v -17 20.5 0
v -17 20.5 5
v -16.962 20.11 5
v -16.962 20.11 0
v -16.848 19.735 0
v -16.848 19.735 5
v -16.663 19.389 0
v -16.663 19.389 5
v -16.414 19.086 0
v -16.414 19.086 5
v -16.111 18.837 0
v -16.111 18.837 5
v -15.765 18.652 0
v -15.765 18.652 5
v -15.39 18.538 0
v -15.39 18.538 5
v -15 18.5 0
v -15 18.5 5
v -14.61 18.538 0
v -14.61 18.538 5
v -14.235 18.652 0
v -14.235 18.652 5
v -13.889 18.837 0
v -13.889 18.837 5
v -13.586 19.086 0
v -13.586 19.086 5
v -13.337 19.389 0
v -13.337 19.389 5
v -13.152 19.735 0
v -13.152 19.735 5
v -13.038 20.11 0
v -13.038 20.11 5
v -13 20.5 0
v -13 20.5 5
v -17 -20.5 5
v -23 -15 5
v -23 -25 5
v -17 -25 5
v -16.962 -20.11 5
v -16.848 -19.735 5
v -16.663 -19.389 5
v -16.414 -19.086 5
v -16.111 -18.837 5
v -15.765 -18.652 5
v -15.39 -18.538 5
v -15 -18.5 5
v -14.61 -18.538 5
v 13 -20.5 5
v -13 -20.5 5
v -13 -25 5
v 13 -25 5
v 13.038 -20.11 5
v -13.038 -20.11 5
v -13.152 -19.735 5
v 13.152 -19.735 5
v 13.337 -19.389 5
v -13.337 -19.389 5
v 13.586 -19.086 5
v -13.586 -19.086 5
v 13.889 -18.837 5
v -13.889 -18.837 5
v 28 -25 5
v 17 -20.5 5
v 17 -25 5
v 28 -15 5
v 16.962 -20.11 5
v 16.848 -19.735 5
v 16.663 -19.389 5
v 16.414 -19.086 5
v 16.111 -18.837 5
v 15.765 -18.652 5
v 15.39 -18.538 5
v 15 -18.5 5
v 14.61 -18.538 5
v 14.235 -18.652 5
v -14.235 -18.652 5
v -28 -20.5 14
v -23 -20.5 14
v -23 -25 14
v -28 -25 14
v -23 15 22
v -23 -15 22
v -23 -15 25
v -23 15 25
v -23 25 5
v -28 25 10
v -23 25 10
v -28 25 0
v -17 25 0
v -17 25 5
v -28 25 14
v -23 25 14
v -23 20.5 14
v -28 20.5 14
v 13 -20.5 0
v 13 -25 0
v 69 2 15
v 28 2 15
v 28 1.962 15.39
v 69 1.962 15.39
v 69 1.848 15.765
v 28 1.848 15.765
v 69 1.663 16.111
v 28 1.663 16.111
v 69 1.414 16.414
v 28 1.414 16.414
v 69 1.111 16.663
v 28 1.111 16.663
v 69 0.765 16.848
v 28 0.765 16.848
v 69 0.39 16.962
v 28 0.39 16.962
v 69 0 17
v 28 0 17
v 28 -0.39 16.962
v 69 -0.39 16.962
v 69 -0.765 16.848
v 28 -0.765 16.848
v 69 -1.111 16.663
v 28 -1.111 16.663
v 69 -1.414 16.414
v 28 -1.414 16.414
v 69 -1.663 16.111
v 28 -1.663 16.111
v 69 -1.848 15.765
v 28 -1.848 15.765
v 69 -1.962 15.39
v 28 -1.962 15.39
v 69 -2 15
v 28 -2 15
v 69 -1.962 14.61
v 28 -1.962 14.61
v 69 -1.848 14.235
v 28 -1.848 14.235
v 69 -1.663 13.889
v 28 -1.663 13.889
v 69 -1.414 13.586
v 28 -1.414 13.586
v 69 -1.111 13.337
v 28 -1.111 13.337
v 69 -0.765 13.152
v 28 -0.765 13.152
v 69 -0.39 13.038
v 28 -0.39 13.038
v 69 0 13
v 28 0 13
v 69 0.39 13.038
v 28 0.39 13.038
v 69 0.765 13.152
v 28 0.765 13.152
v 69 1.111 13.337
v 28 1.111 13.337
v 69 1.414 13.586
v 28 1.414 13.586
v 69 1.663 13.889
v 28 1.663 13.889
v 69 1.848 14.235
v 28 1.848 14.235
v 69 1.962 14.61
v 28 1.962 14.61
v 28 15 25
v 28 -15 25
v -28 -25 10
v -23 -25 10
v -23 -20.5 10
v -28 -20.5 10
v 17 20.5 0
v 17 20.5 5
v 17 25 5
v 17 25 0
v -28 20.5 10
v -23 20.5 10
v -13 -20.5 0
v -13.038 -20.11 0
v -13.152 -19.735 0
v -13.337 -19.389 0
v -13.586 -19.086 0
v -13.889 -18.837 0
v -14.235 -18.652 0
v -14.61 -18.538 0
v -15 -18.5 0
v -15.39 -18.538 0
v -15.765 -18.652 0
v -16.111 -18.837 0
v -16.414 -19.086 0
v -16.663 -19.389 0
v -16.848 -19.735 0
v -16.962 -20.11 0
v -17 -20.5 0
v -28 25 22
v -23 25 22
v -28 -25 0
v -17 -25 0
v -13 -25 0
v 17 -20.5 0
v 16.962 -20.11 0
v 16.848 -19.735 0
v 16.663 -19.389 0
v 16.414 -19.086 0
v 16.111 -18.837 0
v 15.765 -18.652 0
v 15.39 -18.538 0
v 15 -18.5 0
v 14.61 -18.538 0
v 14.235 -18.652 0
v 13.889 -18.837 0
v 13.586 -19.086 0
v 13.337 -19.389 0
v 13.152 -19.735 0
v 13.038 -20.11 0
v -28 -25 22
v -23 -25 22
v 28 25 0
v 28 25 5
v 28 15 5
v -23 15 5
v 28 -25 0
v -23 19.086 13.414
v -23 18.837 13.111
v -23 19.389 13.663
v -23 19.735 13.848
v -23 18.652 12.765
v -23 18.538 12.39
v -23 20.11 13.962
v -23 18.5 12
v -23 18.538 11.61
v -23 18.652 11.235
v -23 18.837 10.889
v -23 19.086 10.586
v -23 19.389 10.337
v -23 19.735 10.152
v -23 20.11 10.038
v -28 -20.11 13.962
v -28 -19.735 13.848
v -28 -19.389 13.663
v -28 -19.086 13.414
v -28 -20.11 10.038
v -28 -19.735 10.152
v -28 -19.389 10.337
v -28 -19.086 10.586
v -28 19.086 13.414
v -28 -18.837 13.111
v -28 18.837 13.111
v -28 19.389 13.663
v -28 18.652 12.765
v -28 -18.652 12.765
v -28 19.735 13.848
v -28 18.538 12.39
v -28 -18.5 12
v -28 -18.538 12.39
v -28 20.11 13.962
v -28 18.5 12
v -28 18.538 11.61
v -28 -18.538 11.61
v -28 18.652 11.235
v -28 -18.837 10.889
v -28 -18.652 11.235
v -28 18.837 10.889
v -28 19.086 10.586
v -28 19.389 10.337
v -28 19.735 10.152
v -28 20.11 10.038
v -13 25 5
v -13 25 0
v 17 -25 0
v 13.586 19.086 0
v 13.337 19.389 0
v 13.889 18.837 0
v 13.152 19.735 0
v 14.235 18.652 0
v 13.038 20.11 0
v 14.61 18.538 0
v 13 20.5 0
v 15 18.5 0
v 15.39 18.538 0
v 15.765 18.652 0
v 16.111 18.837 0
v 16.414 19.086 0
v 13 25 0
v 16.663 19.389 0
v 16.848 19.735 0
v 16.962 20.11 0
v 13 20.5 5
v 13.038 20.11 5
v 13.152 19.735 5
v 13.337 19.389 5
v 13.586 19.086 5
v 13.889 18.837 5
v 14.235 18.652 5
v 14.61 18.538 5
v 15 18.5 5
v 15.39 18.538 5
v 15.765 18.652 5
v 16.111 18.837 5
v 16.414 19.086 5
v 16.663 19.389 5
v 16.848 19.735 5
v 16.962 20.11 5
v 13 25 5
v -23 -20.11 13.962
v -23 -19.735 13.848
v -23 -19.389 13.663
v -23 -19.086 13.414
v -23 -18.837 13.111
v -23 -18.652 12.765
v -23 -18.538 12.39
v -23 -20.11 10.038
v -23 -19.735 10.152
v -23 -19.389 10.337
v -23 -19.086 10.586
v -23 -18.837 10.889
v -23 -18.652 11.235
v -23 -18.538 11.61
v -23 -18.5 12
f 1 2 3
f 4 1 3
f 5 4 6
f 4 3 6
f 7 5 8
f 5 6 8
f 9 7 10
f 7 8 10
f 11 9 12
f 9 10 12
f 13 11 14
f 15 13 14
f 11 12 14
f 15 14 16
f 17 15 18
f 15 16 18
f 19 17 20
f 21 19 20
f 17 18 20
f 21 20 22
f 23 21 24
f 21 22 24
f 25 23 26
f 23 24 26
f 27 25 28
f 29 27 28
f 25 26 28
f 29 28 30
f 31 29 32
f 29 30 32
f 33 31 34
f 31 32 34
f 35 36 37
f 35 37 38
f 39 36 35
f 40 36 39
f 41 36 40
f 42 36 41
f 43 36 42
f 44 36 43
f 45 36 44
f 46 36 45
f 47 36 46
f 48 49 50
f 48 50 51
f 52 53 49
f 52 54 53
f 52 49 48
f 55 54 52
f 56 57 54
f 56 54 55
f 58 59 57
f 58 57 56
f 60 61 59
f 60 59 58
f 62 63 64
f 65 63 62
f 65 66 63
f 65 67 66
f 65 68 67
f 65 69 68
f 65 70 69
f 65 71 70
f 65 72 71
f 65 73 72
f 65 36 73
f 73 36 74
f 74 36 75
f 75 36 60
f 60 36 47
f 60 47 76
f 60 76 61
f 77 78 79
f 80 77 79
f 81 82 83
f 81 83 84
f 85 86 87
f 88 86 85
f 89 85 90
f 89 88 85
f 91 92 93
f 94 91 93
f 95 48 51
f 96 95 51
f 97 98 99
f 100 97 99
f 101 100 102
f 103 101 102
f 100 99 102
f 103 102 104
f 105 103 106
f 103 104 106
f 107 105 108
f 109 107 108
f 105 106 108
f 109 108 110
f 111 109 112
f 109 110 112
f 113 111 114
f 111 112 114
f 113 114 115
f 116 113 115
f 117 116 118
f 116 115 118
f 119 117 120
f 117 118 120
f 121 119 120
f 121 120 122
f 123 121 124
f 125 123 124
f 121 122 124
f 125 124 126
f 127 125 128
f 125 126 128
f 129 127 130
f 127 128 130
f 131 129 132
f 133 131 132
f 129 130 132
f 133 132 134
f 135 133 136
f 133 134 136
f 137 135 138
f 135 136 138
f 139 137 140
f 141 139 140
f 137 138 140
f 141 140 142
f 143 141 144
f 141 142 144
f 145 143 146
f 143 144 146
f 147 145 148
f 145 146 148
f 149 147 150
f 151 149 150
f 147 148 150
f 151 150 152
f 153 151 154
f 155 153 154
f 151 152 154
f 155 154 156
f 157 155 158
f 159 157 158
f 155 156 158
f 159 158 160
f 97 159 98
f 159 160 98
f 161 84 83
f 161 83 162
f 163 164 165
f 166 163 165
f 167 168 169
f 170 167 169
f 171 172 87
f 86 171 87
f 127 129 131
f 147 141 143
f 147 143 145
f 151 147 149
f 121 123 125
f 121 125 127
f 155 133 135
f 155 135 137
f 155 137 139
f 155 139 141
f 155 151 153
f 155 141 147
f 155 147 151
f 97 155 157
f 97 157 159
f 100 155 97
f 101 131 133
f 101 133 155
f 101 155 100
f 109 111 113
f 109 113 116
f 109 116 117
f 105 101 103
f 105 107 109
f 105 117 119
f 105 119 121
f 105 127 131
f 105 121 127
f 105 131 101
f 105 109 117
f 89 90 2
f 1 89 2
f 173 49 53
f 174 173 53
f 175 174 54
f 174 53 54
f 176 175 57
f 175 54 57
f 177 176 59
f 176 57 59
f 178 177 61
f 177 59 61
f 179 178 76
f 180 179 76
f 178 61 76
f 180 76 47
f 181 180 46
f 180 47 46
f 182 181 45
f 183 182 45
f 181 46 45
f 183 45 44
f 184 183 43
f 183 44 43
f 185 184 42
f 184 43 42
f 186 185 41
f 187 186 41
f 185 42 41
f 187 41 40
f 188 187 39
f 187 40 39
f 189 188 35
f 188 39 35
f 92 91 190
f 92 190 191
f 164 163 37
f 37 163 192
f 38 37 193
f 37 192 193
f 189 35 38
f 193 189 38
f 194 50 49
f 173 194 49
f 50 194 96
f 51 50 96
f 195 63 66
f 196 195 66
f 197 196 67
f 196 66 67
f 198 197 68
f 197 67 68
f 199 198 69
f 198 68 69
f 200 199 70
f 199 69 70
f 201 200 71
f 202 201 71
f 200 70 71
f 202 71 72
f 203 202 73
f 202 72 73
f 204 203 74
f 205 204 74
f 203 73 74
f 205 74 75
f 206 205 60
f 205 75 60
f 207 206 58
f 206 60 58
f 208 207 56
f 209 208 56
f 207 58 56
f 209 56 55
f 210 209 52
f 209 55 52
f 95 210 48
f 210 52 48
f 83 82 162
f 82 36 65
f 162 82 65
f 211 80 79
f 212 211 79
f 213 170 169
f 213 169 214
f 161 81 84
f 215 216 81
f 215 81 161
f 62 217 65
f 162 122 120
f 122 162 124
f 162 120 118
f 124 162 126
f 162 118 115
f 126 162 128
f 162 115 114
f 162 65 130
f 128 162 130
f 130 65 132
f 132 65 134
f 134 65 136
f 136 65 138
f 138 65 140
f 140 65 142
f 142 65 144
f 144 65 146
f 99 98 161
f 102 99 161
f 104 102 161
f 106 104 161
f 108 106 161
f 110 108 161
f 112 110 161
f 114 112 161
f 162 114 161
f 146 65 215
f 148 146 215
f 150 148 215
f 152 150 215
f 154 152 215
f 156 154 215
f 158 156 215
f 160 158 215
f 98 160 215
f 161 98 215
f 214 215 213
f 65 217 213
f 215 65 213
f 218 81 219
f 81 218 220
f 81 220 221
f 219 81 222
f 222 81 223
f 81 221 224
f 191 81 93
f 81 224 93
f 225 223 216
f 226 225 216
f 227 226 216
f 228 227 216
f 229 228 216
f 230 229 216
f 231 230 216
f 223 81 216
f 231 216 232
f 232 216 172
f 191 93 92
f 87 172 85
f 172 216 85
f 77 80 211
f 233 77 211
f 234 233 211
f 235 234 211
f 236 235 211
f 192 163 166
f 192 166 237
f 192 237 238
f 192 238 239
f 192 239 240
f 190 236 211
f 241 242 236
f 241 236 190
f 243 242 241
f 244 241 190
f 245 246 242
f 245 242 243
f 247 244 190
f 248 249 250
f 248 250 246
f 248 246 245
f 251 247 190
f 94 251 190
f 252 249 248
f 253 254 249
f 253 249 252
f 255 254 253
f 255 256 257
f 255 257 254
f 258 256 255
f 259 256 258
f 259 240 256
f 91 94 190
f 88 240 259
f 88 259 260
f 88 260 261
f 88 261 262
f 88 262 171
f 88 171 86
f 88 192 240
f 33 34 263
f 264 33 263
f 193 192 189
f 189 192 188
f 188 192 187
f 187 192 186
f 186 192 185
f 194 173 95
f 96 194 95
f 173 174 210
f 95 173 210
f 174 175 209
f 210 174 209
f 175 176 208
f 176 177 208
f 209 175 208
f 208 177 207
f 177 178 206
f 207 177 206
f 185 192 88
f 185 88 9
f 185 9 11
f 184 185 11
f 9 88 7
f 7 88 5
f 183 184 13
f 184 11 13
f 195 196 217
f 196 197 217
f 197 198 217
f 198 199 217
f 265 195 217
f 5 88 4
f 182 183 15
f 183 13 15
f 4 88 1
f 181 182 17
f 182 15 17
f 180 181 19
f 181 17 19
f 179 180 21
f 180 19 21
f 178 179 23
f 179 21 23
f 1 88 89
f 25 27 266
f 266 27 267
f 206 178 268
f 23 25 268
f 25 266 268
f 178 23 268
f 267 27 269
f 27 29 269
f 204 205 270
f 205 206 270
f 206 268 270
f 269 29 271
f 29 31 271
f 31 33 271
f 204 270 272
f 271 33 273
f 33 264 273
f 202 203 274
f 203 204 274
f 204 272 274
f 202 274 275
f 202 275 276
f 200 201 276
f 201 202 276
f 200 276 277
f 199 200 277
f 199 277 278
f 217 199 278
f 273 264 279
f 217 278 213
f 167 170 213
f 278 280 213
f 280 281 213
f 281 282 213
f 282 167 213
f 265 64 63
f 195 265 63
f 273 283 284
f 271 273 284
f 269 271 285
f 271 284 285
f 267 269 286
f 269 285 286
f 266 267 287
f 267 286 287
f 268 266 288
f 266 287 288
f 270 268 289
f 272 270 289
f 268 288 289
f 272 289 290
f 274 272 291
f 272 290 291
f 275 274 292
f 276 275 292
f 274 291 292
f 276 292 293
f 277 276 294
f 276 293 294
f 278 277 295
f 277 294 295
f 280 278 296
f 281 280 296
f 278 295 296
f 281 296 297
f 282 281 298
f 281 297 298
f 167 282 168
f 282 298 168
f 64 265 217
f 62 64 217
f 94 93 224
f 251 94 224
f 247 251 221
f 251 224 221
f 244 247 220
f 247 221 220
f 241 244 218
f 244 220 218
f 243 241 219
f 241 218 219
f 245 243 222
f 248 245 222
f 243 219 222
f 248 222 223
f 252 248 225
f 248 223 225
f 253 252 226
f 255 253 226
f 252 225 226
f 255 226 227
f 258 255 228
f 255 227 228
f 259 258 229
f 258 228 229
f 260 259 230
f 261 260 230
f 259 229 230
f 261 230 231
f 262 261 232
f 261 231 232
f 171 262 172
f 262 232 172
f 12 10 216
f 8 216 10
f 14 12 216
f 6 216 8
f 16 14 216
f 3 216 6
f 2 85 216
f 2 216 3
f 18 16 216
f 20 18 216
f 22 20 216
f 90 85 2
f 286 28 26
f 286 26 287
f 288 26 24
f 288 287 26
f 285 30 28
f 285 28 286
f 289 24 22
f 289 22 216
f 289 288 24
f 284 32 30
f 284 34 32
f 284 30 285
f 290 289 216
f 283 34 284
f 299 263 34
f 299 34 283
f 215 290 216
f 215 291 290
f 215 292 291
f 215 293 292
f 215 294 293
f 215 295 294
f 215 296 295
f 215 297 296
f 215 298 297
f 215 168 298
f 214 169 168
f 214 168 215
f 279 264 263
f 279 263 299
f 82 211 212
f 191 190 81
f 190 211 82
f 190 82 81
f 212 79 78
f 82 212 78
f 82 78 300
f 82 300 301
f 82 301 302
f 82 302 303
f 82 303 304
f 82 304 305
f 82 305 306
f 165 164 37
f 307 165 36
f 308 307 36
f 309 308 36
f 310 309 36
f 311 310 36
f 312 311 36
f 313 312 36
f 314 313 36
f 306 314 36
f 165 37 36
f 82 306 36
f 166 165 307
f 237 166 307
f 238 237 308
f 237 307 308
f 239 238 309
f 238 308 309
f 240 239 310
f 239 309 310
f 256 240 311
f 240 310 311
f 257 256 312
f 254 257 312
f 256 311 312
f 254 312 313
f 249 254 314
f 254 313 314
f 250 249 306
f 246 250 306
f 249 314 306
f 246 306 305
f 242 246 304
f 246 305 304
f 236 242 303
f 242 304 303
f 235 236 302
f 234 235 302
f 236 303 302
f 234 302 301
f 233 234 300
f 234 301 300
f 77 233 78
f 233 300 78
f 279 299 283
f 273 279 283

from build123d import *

# Parameters (mm, degrees)
F0_W      = 56
F0_H      = 50
F1_DEPTH  = 5
F3_DEPTH  = 5
F4_W      = 5
F4_H      = 50
F5_DEPTH  = 17
F6_W      = 51
F6_H      = 30
F7_DEPTH  = 20
F9_DEPTH  = 5
F10_R     = 2
F11_DEPTH = 41


with BuildPart() as f1:
    # F0 (on Top) → F1 (new body)
    with BuildSketch(Plane.XY):
        Rectangle(F0_W, F0_H)
    extrude(amount=F1_DEPTH)

    # F2 (on face) → F3 (cut, through all)
    with BuildSketch(Plane.XY.offset(5)):
        with BuildLine():
            Line((17, -25), (17, -20.5))
            ThreePointArc((17, -20.5), (15, -18.5), (13, -20.5))
            Line((13, -20.5), (13, -25))
            Line((13, -25), (17, -25))
        make_face()
        with BuildLine():
            ThreePointArc((13, 20.5), (15, 18.5), (17, 20.5))
            Line((17, 20.5), (17, 25))
            Line((17, 25), (13, 25))
            Line((13, 25), (13, 20.5))
        make_face()
        with BuildLine():
            Line((-17, 25), (-17, 20.5))
            ThreePointArc((-17, 20.5), (-15, 18.5), (-13, 20.5))
            Line((-13, 20.5), (-13, 25))
            Line((-13, 25), (-17, 25))
        make_face()
        with BuildLine():
            ThreePointArc((-13, -20.5), (-15, -18.5), (-17, -20.5))
            Line((-17, -20.5), (-17, -25))
            Line((-17, -25), (-13, -25))
            Line((-13, -25), (-13, -20.5))
        make_face()
    extrude(amount=-F3_DEPTH, mode=Mode.SUBTRACT)

    # F4 (on face) → F5 (join)
    with BuildSketch(Plane.XY.offset(5)):
        with Locations((-25.5, 0)):
            Rectangle(F4_W, F4_H)
    extrude(amount=F5_DEPTH)

    # F6 (on face) → F7 (join)
    with BuildSketch(Plane.XY.offset(5)):
        with Locations((2.5, 0)):
            Rectangle(F6_W, F6_H)
    extrude(amount=F7_DEPTH)

    # F8 (on face) → F9 (cut, through all)
    with BuildSketch(Plane.YZ.offset(-23)):
        with BuildLine():
            Line((-25, 10), (-20.5, 10))
            ThreePointArc((-20.5, 10), (-18.5, 12), (-20.5, 14))
            Line((-20.5, 14), (-25, 14))
            Line((-25, 14), (-25, 10))
        make_face()
        with BuildLine():
            ThreePointArc((20.5, 14), (18.5, 12), (20.5, 10))
            Line((20.5, 10), (25, 10))
            Line((25, 10), (25, 14))
            Line((25, 14), (20.5, 14))
        make_face()
    extrude(amount=-F9_DEPTH, mode=Mode.SUBTRACT)

    # F10 (on face) → F11 (join)
    with BuildSketch(Plane.YZ.offset(28)):
        with Locations((0, 15)):
            Circle(F10_R)
    extrude(amount=F11_DEPTH)


solid = f1.part
